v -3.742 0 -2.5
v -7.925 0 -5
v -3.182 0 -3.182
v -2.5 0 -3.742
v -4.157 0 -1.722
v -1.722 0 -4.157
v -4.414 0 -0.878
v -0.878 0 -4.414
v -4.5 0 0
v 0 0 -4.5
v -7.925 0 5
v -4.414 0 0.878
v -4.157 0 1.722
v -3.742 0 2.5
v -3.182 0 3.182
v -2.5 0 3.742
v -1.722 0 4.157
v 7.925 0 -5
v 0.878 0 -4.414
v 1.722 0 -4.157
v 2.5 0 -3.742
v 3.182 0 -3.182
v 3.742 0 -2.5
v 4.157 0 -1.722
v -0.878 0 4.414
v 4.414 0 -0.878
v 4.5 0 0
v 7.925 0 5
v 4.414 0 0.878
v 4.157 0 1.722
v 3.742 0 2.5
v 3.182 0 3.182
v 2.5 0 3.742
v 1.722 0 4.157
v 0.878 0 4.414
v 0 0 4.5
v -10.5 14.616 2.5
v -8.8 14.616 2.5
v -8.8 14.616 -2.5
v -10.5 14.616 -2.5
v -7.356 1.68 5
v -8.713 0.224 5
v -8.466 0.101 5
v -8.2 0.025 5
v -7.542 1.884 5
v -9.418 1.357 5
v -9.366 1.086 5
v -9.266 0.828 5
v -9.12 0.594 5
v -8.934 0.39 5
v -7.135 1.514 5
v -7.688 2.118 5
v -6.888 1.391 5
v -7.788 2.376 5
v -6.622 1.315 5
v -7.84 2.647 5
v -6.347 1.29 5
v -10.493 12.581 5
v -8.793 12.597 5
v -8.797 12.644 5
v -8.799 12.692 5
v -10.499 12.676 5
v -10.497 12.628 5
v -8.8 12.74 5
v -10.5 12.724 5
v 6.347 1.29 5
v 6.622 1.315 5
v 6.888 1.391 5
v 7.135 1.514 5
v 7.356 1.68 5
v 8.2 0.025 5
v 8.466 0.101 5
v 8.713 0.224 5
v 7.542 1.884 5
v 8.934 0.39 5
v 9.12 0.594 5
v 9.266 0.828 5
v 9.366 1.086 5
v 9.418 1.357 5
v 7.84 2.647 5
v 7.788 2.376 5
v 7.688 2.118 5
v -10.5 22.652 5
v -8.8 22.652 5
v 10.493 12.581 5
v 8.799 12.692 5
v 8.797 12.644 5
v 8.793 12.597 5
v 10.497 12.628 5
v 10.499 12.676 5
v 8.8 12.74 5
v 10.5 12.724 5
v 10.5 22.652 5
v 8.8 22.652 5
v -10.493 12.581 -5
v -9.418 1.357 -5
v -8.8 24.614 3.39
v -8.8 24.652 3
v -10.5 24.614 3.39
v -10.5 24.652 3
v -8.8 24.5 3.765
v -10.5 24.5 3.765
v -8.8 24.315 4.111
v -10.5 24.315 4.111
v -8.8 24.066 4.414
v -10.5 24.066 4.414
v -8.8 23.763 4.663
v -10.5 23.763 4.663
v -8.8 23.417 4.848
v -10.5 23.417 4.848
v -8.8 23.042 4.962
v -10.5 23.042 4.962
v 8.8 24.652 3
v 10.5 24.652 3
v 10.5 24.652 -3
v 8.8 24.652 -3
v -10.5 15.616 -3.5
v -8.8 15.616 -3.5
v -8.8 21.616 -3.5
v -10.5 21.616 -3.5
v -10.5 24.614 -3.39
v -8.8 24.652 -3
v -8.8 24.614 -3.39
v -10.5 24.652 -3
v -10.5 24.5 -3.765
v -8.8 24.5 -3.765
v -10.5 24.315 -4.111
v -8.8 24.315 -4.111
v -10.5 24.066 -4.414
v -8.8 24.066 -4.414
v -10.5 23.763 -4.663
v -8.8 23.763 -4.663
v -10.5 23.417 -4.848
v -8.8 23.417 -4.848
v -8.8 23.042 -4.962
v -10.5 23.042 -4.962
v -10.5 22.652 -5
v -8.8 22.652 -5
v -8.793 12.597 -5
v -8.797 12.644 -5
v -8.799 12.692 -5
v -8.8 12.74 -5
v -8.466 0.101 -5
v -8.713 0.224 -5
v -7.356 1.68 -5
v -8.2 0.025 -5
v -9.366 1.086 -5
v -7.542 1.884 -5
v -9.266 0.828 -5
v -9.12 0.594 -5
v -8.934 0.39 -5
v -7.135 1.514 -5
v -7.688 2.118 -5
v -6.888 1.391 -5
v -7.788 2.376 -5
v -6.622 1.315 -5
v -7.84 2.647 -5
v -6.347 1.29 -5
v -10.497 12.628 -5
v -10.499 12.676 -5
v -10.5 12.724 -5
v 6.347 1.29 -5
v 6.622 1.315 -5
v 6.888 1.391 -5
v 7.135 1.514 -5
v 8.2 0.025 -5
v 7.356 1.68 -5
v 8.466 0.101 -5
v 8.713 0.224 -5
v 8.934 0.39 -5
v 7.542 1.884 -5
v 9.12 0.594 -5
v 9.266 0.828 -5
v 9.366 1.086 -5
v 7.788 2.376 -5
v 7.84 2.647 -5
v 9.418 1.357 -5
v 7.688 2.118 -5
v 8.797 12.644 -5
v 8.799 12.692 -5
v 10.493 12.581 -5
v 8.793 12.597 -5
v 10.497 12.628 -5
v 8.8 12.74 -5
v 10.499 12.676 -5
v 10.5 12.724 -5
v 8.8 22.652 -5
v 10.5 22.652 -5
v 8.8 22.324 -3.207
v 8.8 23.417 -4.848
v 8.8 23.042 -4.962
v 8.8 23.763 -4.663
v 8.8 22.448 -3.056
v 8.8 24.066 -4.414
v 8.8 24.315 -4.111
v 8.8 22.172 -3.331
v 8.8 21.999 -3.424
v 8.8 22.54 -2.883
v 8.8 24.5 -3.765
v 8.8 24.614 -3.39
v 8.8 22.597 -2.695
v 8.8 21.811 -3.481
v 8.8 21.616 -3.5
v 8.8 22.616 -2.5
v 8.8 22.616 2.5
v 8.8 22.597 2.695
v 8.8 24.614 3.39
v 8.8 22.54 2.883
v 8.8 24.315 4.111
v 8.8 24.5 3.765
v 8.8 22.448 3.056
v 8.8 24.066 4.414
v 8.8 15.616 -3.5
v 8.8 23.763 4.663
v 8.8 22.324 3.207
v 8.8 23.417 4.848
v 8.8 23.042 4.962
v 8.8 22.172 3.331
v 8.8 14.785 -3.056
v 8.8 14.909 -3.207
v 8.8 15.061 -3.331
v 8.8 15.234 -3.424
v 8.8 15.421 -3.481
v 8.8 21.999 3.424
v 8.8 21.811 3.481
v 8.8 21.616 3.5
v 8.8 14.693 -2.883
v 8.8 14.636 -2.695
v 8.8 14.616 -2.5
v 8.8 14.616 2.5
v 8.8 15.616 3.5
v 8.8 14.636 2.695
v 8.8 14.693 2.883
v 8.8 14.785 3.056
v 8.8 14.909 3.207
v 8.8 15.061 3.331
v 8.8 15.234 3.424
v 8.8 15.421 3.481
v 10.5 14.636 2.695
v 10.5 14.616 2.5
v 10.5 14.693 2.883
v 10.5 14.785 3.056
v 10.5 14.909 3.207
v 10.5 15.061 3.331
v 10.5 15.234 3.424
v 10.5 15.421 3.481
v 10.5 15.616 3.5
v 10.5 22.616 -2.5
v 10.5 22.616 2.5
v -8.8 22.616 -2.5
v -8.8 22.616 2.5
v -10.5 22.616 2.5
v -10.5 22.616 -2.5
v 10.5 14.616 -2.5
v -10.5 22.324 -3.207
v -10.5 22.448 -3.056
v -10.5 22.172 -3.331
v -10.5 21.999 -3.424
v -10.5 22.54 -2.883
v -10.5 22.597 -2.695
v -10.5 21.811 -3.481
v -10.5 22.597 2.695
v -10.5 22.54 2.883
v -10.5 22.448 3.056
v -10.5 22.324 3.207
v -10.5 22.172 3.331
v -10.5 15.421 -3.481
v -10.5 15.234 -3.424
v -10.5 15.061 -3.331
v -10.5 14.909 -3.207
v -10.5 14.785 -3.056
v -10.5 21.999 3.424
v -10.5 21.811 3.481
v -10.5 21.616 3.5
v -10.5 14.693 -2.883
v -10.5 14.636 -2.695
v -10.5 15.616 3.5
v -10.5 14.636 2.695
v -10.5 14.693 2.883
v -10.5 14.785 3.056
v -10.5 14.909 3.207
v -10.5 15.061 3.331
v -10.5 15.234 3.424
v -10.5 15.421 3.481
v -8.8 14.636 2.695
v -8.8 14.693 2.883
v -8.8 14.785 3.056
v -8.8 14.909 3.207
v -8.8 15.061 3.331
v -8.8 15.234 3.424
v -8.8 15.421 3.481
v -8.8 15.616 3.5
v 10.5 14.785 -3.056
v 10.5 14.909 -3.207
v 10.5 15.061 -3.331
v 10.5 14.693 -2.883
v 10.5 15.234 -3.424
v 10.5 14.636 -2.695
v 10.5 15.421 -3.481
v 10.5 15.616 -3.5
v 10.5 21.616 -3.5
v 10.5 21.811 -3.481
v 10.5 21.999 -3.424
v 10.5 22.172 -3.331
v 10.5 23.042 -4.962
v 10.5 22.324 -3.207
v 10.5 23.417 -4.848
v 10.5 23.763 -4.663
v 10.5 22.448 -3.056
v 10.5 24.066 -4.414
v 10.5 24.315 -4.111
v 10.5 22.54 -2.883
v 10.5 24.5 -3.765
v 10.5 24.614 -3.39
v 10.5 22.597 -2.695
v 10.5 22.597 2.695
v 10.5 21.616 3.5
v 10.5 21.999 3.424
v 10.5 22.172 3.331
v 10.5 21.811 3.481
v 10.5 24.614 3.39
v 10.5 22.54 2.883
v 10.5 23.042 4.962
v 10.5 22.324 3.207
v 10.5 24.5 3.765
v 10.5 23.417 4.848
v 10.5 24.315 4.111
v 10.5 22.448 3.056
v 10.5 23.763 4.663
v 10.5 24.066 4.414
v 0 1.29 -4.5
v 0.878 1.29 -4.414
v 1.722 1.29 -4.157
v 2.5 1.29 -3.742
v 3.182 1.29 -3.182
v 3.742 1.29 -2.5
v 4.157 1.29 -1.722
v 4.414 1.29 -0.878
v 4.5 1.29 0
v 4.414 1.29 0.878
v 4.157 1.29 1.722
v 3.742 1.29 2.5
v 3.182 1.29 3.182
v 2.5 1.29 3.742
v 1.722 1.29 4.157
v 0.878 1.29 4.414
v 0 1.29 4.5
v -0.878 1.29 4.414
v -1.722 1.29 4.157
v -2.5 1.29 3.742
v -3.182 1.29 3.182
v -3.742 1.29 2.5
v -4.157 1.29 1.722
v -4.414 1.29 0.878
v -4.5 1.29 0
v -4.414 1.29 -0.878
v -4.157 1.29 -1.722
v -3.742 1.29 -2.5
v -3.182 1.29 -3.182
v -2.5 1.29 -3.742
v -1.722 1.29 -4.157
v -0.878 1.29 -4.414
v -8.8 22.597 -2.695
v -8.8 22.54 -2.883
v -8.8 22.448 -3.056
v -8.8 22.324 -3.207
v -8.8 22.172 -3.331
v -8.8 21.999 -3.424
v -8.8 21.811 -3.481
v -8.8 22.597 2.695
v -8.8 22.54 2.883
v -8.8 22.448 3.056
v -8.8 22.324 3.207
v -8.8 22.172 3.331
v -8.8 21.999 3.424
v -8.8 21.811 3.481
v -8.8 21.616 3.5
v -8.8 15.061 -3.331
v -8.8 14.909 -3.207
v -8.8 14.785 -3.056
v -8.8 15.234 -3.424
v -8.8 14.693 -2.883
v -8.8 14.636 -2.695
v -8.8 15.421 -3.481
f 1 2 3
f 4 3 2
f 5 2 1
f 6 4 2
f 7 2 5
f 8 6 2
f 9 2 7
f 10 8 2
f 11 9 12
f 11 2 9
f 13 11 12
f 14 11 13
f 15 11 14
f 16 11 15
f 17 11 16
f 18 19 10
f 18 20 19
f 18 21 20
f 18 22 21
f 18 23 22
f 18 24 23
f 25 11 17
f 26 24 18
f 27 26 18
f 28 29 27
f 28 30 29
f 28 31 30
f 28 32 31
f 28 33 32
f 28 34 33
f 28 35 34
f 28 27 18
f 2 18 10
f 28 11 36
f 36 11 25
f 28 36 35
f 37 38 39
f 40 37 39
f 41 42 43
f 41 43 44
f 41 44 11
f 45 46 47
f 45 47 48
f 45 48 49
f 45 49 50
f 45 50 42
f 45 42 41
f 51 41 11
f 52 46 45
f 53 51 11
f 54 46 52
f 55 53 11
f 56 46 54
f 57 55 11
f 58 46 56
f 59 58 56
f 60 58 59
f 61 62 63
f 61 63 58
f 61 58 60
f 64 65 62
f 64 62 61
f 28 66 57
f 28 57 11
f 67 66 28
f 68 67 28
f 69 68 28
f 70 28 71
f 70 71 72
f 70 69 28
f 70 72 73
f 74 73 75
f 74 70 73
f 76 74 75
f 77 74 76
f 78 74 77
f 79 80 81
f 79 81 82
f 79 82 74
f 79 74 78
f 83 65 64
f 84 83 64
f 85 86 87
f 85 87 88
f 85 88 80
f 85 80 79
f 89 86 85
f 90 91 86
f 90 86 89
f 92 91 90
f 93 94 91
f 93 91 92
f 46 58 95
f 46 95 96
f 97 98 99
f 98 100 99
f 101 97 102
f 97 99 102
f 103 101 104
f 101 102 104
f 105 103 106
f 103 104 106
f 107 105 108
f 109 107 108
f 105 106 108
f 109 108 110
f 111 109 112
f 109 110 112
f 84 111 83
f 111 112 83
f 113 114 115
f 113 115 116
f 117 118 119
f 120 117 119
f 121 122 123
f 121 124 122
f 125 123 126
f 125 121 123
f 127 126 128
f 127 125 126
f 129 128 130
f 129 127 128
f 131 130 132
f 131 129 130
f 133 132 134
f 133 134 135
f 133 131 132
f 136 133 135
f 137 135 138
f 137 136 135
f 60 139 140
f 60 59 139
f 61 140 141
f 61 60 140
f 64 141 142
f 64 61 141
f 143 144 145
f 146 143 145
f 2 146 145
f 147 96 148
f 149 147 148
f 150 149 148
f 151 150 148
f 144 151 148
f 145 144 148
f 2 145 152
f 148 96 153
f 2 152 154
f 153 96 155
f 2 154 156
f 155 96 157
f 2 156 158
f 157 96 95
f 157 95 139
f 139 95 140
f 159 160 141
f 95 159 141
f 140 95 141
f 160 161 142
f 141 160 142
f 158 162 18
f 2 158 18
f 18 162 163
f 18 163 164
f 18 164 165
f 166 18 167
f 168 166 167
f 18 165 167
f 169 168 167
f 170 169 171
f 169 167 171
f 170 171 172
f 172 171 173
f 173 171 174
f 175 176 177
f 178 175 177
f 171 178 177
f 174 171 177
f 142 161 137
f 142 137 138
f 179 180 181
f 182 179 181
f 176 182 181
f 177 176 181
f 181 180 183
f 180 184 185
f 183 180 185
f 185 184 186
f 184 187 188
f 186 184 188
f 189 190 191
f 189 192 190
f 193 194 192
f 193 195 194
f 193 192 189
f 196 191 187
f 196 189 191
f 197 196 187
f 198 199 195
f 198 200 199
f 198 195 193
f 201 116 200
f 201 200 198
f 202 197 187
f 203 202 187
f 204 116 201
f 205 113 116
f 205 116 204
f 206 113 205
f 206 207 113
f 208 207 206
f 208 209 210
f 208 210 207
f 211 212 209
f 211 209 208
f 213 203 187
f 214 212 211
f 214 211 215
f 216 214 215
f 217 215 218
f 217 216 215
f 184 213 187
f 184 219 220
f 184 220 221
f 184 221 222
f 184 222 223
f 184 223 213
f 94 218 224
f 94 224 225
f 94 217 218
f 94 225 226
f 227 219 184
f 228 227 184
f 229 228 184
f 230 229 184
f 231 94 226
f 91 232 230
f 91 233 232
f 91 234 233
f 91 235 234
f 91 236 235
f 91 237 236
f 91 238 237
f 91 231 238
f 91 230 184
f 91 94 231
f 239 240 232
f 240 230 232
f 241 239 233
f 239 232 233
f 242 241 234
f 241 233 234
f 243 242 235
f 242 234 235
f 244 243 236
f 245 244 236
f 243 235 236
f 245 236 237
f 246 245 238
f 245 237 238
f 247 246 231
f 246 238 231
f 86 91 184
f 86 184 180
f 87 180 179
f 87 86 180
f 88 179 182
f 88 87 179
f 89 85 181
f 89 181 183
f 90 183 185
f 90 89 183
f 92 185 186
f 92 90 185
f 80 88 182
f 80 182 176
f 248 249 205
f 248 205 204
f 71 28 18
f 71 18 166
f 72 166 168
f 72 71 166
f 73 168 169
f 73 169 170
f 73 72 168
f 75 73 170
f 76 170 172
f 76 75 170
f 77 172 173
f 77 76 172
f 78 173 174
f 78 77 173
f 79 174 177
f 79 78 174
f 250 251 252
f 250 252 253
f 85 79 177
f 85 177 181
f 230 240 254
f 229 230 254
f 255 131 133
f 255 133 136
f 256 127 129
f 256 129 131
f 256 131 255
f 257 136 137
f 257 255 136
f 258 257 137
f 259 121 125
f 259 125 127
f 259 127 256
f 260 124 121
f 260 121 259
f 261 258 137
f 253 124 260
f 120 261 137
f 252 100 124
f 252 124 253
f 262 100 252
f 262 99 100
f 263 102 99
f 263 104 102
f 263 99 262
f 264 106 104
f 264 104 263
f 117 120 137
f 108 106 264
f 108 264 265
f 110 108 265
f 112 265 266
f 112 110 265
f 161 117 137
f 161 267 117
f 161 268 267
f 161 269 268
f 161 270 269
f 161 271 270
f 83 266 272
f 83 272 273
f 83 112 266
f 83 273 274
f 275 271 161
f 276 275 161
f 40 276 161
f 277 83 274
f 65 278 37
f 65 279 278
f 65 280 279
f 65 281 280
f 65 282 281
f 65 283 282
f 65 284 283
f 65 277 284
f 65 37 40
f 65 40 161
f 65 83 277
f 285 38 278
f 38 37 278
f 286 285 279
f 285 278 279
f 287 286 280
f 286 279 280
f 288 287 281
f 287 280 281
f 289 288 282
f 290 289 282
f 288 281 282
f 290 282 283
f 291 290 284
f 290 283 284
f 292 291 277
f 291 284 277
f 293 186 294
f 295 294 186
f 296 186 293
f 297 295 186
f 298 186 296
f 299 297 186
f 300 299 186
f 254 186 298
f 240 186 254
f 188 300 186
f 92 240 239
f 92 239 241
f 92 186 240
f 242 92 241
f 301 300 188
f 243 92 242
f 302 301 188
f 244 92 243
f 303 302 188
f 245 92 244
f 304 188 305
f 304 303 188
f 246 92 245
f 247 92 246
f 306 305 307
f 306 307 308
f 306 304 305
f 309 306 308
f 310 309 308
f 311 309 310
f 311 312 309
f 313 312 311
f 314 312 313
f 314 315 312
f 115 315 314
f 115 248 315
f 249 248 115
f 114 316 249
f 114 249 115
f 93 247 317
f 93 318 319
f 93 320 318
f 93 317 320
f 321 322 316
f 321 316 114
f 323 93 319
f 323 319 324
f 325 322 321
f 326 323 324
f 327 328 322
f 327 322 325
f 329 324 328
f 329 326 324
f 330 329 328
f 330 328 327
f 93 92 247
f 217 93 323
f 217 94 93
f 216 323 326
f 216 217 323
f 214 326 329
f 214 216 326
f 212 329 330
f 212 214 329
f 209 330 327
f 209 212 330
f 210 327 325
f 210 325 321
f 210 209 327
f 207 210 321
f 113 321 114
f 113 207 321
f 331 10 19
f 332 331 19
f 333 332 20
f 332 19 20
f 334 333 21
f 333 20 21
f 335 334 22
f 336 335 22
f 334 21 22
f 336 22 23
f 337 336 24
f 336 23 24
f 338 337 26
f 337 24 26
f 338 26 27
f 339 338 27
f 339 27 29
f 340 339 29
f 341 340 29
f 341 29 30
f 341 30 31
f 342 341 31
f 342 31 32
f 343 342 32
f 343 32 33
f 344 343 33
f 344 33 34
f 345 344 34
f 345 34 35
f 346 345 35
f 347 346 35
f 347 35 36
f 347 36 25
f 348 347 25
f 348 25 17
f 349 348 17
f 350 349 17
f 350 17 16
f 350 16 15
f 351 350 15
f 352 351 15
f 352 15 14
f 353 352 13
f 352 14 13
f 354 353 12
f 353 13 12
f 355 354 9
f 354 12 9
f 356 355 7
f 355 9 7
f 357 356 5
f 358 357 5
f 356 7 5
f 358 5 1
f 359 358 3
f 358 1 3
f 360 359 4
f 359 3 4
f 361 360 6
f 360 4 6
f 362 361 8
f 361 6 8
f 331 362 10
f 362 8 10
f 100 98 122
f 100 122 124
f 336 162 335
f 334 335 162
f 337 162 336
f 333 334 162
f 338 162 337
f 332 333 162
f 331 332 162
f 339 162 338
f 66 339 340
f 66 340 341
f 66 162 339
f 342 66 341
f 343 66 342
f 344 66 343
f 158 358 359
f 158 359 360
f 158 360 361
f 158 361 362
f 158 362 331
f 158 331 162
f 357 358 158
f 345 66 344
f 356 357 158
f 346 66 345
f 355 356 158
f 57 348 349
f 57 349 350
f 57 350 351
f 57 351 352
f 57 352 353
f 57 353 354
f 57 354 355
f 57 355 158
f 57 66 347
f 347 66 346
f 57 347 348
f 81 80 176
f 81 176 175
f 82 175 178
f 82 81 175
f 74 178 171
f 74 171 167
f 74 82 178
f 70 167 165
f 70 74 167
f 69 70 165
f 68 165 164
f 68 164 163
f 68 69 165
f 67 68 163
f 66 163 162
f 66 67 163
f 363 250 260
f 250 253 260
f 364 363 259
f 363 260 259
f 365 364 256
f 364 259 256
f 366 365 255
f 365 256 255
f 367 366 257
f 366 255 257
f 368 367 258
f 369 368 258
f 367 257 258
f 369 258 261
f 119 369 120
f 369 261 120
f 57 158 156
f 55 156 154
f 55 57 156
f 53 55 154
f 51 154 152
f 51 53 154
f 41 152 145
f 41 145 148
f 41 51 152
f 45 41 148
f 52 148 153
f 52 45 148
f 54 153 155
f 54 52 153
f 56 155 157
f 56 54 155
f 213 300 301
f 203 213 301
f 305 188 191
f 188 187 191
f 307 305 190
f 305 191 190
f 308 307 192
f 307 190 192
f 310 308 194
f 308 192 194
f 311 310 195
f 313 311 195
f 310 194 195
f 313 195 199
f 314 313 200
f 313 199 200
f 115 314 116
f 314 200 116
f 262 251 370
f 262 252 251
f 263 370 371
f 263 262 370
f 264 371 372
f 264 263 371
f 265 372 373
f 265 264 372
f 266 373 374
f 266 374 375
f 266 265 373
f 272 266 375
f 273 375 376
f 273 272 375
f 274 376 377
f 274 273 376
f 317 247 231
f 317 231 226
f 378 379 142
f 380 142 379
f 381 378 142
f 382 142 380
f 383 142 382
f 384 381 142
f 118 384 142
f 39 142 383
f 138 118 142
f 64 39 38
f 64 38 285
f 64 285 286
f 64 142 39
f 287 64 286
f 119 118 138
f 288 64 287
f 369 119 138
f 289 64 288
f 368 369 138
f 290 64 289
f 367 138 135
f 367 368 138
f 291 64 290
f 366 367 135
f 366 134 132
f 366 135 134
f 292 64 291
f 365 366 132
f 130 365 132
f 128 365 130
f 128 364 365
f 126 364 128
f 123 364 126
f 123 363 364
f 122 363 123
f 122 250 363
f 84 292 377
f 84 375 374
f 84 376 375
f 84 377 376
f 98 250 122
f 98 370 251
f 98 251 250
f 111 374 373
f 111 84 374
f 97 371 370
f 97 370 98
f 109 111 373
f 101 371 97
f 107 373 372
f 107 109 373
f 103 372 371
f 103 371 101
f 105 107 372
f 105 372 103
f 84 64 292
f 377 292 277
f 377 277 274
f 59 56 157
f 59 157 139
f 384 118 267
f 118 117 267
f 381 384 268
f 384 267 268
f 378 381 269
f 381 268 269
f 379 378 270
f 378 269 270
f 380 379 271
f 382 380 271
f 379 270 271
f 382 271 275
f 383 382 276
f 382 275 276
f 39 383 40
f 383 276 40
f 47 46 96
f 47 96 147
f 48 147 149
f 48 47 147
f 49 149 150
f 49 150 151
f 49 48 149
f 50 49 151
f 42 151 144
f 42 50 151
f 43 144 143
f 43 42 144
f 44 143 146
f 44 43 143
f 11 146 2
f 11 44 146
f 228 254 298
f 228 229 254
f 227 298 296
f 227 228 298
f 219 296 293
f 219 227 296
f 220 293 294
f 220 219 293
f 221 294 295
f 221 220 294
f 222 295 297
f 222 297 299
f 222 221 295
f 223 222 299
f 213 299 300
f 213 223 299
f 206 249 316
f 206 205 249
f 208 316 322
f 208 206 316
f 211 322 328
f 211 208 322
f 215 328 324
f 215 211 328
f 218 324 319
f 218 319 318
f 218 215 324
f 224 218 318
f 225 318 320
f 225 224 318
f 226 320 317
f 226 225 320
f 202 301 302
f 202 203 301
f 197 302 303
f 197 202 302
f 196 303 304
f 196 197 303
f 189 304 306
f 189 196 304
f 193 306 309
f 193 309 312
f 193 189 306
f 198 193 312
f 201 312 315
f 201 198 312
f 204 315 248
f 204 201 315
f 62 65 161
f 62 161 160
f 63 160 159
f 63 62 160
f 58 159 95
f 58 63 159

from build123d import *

# Parameters (mm, degrees)
SALIENTE_EXTRUIR1_DEPTH = 5
CROQUIS2_R              = 4.5
CORTAR_EXTRUIR1_DEPTH   = 28.257564023
CROQUIS3_W              = 7
CROQUIS3_H              = 8
CORTAR_EXTRUIR2_DEPTH   = 33.767740179
REDONDEO1_R             = 2
REDONDEO2_R             = 1


with BuildPart() as part:
    # Croquis1 → Saliente-Extruir1 (new, symmetric)
    with BuildSketch(Plane.XY):
        with BuildLine():
            Line((-8.8, 24.652074892), (-10.5, 24.652074892))
            Line((-10.5, 24.652074892), (-10.5, 12.723760553))
            ThreePointArc((-10.5, 12.723760553), (-10.498289984, 12.652156614), (-10.493163835, 12.580715934))
            Line((-10.493163835, 12.580715934), (-9.417931151, 1.356955381))
            ThreePointArc((-9.417931151, 1.356955381), (-8.933586693, 0.389917361), (-7.924767316, 0))
            Line((-7.924767316, 0), (7.924767316, 0))
            ThreePointArc((7.924767316, 0), (8.933586693, 0.389917361), (9.417931151, 1.356955381))
            Line((9.417931151, 1.356955381), (10.493163835, 12.580715934))
            ThreePointArc((10.493163835, 12.580715934), (10.498289984, 12.652156614), (10.5, 12.723760553))
            Line((10.5, 12.723760553), (10.5, 24.652074892))
            Line((10.5, 24.652074892), (8.8, 24.652074892))
            Line((8.8, 24.652074892), (8.8, 12.739594081))
            ThreePointArc((8.8, 12.739594081), (8.798289984, 12.667990142), (8.793163835, 12.596549461))
            Line((8.793163835, 12.596549461), (7.839995893, 2.646955381))
            ThreePointArc((7.839995893, 2.646955381), (7.355651435, 1.679917361), (6.346832058, 1.29))
            Line((6.346832058, 1.29), (-6.346832058, 1.29))
            ThreePointArc((-6.346832058, 1.29), (-7.355651435, 1.679917361), (-7.839995893, 2.646955381))
            Line((-7.839995893, 2.646955381), (-8.793163835, 12.596549461))
            ThreePointArc((-8.793163835, 12.596549461), (-8.798289984, 12.667990142), (-8.8, 12.739594081))
            Line((-8.8, 12.739594081), (-8.8, 24.652074892))
        make_face()
    extrude(amount=SALIENTE_EXTRUIR1_DEPTH, both=True)

    # Croquis2 → Cortar-Extruir1 (cut, through all)
    with BuildSketch(Plane.XZ):
        with Locations(Location((0, 0, 0), (0, 0, 270))):
            Circle(CROQUIS2_R)
    extrude(amount=-CORTAR_EXTRUIR1_DEPTH, mode=Mode.SUBTRACT)

    # Croquis3 → Cortar-Extruir2 (cut, through all)
    with BuildSketch(Plane(origin=(10.5, 0, 0), x_dir=(0, 0, -1), z_dir=(1, 0, 0))):
        with Locations((0, 18.616395413)):
            Rectangle(CROQUIS3_W, CROQUIS3_H)
    extrude(amount=-CORTAR_EXTRUIR2_DEPTH, mode=Mode.SUBTRACT)

    # Redondeo1
    redondeo1_edges = [part.edges().sort_by_distance(p)[0] for p in [
        (9.65, 24.652074892, -5),
        (-9.65, 24.652074892, -5),
        (9.65, 24.652074892, 5),
        (-9.65, 24.652074892, 5),
    ]]
    fillet(redondeo1_edges, radius=REDONDEO1_R)

    # Redondeo2
    redondeo2_edges = [part.edges().sort_by_distance(p)[0] for p in [
        (-9.65, 22.616395413, -3.5),
        (9.65, 22.616395413, -3.5),
        (-9.65, 14.616395413, -3.5),
        (9.65, 14.616395413, -3.5),
        (-9.65, 14.616395413, 3.5),
        (9.65, 14.616395413, 3.5),
        (-9.65, 22.616395413, 3.5),
        (9.65, 22.616395413, 3.5),
    ]]
    fillet(redondeo2_edges, radius=REDONDEO2_R)


solid = part.part
